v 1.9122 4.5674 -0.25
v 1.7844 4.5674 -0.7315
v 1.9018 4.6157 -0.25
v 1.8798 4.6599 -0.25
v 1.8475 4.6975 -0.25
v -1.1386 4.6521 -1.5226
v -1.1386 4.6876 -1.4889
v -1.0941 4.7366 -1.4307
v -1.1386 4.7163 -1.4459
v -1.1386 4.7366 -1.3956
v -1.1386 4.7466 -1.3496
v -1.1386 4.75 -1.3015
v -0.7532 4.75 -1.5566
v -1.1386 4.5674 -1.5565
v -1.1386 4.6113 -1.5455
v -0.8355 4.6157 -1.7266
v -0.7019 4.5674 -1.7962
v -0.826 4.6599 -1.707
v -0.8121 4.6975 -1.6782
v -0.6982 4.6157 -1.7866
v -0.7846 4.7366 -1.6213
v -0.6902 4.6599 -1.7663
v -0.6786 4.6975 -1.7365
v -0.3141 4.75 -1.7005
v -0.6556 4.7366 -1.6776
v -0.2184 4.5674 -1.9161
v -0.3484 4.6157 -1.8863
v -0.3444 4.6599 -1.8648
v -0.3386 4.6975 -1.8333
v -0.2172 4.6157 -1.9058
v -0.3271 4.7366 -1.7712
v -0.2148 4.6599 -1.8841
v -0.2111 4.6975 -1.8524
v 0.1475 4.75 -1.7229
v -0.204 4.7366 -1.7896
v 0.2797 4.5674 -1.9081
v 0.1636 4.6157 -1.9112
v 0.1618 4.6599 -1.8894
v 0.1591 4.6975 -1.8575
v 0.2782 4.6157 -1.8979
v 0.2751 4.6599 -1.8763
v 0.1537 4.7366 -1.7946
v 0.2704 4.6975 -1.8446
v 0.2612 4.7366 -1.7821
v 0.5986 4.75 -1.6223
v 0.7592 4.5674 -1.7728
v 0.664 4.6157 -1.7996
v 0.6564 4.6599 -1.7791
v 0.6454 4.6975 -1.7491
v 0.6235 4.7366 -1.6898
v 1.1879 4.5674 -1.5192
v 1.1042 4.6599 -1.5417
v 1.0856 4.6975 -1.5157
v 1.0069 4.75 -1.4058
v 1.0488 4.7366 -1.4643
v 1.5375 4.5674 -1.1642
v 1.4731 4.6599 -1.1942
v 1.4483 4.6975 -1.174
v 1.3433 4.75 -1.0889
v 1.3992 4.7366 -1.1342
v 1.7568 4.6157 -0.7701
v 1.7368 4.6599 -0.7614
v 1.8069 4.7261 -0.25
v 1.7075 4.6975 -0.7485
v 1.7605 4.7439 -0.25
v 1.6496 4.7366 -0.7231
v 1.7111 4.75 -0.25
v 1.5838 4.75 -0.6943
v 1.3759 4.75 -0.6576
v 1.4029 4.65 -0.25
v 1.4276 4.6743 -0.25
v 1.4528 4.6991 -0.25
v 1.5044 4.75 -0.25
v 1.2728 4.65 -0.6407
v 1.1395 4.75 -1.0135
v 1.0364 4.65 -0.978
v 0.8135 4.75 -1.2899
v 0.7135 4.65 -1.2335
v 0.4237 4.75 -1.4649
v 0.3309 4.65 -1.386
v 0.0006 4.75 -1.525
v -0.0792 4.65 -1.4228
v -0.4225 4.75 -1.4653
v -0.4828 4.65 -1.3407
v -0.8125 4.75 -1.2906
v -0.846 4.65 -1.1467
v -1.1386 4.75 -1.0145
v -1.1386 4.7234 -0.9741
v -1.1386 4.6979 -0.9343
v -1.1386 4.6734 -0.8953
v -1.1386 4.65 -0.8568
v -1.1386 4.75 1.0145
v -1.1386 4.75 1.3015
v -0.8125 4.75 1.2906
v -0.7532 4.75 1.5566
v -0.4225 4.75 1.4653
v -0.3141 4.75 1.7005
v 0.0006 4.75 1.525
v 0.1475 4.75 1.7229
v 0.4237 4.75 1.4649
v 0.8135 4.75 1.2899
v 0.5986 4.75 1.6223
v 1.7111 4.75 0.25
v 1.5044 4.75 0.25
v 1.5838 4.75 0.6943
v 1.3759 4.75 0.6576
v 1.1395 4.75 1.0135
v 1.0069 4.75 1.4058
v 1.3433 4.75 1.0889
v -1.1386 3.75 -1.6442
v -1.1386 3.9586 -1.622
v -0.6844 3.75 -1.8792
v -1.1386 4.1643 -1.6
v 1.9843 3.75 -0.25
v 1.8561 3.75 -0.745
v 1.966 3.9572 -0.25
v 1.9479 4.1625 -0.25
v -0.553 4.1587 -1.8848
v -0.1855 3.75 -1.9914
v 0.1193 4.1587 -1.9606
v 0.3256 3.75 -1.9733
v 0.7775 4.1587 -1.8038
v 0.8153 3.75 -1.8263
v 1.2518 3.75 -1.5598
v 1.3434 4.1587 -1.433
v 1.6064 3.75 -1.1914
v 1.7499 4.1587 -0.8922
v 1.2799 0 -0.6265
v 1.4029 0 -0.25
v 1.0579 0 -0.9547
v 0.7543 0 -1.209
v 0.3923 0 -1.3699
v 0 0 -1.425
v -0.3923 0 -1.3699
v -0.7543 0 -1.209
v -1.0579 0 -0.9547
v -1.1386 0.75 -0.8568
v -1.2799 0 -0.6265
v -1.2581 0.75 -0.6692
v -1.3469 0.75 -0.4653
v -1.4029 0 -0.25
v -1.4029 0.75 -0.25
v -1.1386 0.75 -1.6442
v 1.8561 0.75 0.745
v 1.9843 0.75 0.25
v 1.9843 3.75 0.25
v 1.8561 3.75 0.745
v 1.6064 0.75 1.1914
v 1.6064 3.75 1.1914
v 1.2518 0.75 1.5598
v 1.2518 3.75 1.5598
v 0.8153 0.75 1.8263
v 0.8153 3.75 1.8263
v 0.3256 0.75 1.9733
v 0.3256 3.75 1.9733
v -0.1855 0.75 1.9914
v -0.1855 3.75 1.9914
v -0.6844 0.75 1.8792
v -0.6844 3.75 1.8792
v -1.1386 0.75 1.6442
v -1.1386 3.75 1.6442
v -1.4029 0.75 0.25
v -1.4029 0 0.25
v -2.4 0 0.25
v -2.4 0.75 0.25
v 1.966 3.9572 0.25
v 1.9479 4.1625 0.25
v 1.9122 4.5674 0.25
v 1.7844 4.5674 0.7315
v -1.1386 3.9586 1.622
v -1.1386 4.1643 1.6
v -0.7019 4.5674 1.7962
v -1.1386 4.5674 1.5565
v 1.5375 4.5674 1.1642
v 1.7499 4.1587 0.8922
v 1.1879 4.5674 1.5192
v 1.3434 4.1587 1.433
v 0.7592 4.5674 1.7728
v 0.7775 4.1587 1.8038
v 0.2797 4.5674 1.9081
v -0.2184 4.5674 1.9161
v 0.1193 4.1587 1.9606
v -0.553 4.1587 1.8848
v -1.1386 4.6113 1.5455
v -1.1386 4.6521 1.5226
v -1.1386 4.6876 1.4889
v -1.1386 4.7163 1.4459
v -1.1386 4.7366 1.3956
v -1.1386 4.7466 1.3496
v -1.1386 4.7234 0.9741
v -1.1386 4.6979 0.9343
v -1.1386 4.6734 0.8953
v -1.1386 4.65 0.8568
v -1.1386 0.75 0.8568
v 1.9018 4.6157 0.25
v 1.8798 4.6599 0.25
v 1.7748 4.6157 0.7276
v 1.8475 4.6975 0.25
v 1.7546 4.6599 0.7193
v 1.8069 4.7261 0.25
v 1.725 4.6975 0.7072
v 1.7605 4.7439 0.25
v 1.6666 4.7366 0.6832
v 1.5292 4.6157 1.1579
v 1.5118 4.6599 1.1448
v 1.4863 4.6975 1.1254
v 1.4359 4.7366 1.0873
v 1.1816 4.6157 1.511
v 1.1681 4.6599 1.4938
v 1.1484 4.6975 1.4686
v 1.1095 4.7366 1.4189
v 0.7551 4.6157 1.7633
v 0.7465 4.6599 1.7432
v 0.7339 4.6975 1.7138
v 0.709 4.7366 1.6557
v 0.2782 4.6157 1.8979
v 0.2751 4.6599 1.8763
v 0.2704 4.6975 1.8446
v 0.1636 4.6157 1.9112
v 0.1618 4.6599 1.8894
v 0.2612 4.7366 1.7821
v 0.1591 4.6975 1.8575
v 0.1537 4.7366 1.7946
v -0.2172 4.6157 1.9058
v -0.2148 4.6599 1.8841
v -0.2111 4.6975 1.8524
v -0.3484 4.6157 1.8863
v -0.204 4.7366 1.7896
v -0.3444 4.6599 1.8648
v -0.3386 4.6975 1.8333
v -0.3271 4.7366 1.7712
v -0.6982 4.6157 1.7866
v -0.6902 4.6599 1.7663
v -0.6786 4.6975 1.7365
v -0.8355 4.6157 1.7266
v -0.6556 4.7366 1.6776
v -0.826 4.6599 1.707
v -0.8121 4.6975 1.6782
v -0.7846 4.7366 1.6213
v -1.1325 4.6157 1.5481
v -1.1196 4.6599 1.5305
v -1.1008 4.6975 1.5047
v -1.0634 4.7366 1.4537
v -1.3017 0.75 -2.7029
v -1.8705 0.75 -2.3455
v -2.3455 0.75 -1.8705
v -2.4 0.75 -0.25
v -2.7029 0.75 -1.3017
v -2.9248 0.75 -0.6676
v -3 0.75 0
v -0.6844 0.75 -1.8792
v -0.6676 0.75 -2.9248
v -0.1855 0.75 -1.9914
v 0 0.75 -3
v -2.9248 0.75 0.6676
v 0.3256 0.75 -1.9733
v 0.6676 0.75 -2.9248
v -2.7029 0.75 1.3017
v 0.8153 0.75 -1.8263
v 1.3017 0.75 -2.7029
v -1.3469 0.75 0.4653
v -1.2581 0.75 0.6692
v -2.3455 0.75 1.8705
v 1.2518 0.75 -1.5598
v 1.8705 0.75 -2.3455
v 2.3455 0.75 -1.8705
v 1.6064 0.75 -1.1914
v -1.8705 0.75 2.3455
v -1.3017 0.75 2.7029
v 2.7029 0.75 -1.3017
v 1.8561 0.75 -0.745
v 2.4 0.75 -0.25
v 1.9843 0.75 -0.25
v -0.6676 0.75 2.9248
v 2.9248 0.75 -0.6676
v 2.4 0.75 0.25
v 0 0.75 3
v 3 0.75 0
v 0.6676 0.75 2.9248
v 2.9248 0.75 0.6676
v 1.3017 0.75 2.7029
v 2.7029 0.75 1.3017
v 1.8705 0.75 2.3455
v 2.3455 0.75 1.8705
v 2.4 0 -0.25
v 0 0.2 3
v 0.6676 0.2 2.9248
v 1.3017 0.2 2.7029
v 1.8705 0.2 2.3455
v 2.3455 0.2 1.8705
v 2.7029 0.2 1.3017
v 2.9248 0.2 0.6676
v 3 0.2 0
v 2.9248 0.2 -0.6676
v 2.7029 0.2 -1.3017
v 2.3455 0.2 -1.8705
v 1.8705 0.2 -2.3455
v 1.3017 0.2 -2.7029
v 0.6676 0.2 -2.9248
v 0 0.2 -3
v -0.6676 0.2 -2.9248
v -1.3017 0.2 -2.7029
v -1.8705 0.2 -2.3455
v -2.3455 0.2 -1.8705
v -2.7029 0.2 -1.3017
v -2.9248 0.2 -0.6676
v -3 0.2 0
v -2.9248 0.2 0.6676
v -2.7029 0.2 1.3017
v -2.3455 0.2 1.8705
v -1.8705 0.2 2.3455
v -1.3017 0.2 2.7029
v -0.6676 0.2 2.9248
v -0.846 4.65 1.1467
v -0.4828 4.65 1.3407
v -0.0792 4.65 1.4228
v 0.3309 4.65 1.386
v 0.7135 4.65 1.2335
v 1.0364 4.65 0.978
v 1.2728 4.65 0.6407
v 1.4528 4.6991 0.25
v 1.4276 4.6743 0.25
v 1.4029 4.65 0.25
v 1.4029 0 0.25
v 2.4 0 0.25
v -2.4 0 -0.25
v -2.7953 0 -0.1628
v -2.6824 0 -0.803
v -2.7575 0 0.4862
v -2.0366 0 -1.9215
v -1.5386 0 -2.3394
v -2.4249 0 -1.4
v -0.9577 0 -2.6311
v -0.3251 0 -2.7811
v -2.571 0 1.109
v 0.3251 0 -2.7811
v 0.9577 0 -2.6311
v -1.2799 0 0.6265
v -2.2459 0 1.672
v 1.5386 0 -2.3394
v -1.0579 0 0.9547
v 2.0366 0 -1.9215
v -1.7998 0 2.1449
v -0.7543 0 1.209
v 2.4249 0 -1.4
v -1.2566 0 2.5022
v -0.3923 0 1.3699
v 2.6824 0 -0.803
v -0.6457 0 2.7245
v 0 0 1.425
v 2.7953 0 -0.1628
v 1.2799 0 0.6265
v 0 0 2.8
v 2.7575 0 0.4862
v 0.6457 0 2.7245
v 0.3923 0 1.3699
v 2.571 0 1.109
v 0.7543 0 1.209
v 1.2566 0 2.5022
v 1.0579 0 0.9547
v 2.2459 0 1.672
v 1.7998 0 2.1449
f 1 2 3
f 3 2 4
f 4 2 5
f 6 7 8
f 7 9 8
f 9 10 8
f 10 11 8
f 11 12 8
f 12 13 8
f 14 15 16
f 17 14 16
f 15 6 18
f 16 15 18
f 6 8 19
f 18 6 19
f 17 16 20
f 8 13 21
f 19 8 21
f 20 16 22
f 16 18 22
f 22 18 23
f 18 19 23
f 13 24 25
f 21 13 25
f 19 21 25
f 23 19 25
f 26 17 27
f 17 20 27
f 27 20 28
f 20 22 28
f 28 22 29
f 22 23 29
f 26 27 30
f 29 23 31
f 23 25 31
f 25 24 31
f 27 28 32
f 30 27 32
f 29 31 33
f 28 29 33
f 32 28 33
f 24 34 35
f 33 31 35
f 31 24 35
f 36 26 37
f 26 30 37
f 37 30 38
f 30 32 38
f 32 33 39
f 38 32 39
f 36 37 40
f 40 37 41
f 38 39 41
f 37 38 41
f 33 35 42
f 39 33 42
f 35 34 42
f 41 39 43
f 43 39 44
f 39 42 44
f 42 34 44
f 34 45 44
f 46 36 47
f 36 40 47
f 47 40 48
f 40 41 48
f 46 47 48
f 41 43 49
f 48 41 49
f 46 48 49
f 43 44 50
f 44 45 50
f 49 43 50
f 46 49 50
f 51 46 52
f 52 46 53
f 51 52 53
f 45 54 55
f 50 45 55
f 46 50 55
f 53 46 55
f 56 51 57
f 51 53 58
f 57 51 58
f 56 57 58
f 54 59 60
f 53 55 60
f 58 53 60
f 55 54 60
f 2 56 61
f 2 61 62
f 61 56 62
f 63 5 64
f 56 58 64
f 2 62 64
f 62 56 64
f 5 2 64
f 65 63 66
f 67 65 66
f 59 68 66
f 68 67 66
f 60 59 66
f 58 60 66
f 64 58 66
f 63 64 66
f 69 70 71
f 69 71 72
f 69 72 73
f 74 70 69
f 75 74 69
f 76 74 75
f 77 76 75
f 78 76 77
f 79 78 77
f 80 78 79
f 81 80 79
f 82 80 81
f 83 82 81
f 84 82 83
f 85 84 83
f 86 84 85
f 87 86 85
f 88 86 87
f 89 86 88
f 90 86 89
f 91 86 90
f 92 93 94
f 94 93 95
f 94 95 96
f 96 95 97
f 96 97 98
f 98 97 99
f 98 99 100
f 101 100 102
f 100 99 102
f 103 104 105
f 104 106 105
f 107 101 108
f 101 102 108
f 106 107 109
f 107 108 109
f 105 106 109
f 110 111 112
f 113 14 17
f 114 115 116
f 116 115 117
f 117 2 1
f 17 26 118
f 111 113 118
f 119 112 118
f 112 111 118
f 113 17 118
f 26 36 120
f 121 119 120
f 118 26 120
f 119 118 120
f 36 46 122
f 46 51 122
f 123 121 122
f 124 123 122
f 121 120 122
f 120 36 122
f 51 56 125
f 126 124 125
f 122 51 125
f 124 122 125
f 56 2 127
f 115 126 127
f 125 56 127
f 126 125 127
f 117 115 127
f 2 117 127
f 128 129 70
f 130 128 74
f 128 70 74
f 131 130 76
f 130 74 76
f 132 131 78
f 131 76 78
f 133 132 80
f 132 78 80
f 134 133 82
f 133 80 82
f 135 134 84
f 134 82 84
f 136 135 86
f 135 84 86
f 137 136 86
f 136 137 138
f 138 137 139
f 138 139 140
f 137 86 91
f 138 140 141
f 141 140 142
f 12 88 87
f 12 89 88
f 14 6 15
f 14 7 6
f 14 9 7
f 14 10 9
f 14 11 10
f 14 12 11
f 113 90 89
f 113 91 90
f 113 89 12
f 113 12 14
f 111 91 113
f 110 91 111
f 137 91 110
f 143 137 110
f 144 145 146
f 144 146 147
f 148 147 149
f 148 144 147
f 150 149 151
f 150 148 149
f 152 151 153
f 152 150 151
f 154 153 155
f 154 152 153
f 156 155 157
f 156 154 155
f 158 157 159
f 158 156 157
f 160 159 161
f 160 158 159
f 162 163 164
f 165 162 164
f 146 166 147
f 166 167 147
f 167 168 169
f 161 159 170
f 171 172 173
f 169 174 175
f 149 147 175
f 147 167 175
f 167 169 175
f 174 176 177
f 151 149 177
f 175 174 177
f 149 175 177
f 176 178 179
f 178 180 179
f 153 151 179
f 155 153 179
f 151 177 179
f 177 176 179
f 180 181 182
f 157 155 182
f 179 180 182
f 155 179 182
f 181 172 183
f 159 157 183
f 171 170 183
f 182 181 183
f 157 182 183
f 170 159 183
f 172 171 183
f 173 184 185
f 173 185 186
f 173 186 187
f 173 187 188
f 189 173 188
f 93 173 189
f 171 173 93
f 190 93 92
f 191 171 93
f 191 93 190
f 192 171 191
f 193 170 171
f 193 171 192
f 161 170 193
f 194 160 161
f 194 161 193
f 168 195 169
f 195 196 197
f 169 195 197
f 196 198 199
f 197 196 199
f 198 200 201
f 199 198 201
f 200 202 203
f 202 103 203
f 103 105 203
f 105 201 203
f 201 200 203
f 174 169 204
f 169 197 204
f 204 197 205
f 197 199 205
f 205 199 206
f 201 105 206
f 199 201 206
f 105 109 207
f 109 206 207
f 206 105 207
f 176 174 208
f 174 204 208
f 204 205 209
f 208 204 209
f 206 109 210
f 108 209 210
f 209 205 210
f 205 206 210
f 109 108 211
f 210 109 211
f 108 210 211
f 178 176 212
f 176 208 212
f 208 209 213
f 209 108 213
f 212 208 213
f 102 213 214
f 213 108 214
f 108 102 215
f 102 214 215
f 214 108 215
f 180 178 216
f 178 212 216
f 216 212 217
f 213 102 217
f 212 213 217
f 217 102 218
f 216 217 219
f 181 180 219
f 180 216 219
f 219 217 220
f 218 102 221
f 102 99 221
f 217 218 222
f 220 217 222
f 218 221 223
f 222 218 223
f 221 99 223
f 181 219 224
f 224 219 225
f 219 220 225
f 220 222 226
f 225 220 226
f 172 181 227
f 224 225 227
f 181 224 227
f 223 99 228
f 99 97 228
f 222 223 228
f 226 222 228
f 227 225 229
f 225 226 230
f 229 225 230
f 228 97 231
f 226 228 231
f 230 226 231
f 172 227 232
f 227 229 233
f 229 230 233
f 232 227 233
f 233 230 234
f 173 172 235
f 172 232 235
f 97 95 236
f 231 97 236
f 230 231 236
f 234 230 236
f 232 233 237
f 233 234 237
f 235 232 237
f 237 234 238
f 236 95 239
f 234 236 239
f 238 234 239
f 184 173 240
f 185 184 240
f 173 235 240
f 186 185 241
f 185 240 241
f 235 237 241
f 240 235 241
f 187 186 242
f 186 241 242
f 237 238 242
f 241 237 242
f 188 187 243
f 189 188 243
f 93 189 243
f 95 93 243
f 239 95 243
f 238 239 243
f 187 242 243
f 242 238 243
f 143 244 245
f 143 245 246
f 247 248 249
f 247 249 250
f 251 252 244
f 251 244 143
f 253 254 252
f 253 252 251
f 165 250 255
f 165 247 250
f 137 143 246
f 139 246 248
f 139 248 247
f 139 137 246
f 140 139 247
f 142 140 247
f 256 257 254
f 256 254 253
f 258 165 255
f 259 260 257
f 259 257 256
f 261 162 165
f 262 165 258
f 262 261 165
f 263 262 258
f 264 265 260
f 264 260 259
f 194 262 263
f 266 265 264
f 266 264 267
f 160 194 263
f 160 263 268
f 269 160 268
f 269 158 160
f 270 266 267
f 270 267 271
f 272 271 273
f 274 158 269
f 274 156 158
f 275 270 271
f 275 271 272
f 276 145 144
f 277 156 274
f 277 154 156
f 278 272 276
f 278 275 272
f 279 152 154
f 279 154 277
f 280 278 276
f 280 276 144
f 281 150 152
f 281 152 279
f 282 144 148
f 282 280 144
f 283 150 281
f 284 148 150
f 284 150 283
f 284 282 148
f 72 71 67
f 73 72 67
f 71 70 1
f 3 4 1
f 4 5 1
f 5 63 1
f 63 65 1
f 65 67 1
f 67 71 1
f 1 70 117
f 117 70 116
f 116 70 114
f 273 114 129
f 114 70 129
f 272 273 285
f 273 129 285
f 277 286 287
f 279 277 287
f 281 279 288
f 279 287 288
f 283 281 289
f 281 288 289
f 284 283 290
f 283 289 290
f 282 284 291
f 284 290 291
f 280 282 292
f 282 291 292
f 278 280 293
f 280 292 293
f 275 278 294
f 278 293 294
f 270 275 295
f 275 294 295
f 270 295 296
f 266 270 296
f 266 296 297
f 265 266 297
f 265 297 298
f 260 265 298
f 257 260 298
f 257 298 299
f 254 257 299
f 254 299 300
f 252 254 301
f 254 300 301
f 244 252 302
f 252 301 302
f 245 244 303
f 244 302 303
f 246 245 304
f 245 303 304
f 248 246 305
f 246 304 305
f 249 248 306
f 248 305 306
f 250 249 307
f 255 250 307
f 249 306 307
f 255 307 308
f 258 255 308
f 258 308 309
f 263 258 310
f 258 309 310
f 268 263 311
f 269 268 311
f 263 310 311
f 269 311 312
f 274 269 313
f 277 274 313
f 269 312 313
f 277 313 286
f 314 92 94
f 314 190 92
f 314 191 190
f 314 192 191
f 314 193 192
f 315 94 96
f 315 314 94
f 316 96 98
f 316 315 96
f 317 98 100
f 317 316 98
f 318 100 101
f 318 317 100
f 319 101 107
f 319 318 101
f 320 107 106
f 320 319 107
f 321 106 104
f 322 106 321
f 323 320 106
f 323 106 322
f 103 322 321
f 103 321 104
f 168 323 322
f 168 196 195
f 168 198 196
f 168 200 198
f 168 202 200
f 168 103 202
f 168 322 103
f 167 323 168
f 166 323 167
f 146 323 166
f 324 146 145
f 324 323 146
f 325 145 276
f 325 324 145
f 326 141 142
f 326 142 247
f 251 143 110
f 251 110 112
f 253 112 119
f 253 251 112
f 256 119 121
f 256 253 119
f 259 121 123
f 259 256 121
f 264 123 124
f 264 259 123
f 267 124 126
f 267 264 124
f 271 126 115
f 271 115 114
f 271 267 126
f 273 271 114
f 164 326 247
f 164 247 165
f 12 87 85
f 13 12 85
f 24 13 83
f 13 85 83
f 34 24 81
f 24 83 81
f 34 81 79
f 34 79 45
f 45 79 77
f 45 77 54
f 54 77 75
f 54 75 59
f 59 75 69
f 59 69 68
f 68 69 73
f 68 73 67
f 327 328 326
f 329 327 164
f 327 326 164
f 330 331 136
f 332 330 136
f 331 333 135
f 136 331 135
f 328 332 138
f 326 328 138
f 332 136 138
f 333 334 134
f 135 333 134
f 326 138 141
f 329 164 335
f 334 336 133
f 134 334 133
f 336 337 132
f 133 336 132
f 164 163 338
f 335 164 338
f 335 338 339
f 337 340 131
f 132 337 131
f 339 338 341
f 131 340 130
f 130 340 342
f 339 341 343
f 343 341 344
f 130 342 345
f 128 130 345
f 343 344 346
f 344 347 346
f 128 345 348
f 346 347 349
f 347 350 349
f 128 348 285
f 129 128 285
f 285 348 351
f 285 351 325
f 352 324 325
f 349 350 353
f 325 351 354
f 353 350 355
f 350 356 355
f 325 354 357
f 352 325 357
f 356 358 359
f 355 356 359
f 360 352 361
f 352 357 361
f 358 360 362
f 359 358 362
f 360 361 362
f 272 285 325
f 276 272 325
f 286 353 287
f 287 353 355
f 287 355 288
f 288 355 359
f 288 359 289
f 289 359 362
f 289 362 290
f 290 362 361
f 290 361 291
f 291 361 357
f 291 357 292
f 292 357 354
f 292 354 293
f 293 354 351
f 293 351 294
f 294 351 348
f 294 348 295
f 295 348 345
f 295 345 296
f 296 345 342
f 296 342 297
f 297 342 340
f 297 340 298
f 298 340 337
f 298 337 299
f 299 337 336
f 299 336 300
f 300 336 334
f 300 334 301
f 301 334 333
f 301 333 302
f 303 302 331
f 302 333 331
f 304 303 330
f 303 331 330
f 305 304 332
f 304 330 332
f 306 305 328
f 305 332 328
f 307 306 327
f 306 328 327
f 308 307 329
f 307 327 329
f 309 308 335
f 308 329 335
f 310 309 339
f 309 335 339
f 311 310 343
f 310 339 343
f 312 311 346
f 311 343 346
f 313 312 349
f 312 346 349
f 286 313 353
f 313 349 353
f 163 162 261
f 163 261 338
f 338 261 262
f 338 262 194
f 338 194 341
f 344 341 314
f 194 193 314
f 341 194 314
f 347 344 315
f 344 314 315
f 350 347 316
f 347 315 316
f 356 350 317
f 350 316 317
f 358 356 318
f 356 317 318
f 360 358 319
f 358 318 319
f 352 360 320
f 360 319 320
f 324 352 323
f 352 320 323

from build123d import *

# Parameters (mm, degrees)
SKETCH2_R             = 3
BOSS_EXTRUDE2_DEPTH   = 0.75
BOSS_EXTRUDE3_DEPTH   = 4
CROQUIS1_R            = 1.425
CORTAR_EXTRUIR1_DEPTH = 7.368869601
CHAFL_N1_SIZE         = 0.2
CHAFL_N2_SIZE         = 1
CHAFL_N2_SIZE2        = 0.087488664
CHAFL_N3_SIZE         = 0.1
REDONDEO1_R           = 0.2
CROQUIS2_W            = 1.845726181
CROQUIS2_H            = 0.5
CORTAR_EXTRUIR2_DEPTH = 7.368869676


with BuildPart() as part:
    # Sketch2 → Boss-Extrude2 (new body)
    with BuildSketch(Plane(origin=(0, 0, 0), x_dir=(-1, 0, 0), z_dir=(0, 1, 0))):
        with Locations(Location((0, 0, 0), (0, 0, 90))):
            Circle(SKETCH2_R)
    extrude(amount=BOSS_EXTRUDE2_DEPTH)

    # Sketch3 → Boss-Extrude3 (add)
    with BuildSketch(Plane(origin=(0, 0.75, 0), x_dir=(-1, 0, 0), z_dir=(0, 1, 0))):
        with BuildLine():
            Line((1.13862177, 1.644244649), (1.13862177, -1.644244649))
            ThreePointArc((1.13862177, -1.644244649), (-2, 0), (1.13862177, 1.644244649))
        make_face()
    extrude(amount=BOSS_EXTRUDE3_DEPTH)

    # Croquis1 → Cortar-Extruir1 (cut, through all)
    with BuildSketch(Plane(origin=(0, 4.75, 0), x_dir=(1, 0, 0), z_dir=(0, 1, 0))):
        with Locations(Location((0, 0, 0), (0, 0, 270))):
            Circle(CROQUIS1_R)
    extrude(amount=-CORTAR_EXTRUIR1_DEPTH, mode=Mode.SUBTRACT)

    # Chaflán1
    chafl_n1_edges = [part.edges().sort_by_distance(p)[0] for p in [
        (0, 0, -3),
    ]]
    chamfer(chafl_n1_edges, length=CHAFL_N1_SIZE)

    # Chaflán2
    chafl_n2_edges = [part.edges().sort_by_distance(p)[0] for p in [
        (2, 4.75, 0),
    ]]
    chafl_n2_side = [part.faces().sort_by_distance(p)[0] for p in [
        (2, 2.75, 0),
    ]]
    chamfer(chafl_n2_edges, length=CHAFL_N2_SIZE, length2=CHAFL_N2_SIZE2, reference=chafl_n2_side[0])

    # Chaflán3
    chafl_n3_edges = [part.edges().sort_by_distance(p)[0] for p in [
        (1.275071419, 4.75, -0.636252996),
    ]]
    chamfer(chafl_n3_edges, length=CHAFL_N3_SIZE)

    # Redondeo1
    redondeo1_edges = [part.edges().sort_by_distance(p)[0] for p in [
        (1.912511336, 4.75, 0),
    ]]
    fillet(redondeo1_edges, radius=REDONDEO1_R)

    # Croquis2 → Cortar-Extruir2 (cut, through all)
    with BuildSketch(Plane.XZ):
        with Locations((1.47713691, 0)):
            Rectangle(CROQUIS2_W, CROQUIS2_H)
    cortar_extruir2 = extrude(amount=-CORTAR_EXTRUIR2_DEPTH, mode=Mode.SUBTRACT)

    # Simetría1: Cortar-Extruir2 across plane
    add(cortar_extruir2.mirror(Plane(origin=(0, 0, 0), x_dir=(0, 0, 1), z_dir=(1, 0, 0))), mode=Mode.SUBTRACT)


solid = part.part
